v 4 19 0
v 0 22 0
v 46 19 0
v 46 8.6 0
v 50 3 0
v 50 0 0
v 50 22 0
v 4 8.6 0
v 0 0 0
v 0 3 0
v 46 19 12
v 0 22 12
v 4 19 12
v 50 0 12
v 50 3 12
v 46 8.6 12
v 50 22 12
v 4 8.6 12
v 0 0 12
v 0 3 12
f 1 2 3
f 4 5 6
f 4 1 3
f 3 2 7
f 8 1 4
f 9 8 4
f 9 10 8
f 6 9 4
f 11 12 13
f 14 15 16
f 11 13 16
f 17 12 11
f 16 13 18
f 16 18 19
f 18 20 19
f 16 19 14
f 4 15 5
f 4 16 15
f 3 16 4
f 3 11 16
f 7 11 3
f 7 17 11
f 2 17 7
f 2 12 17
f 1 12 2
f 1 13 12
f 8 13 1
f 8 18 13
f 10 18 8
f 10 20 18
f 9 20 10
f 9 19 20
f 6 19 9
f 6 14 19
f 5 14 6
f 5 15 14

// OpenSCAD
$fn = 32;

// ----------------------------------------------------------------------
// Key bar: dovetail key, 12 mm thick
// ----------------------------------------------------------------------

// --- parameters (mm) ---
profile_height = 12;      // extrusion height
profile_points = 10;      // points of the closed outline

profile = [[0, 0], [50, 0], [50, 3], [46, 8.6], [46, 19], [50, 22], [0, 22], [4, 19], [4, 8.6], [0, 3]];  // single closed polygon, 10 points, counter clockwise

// --- the one profile operation ---
linear_extrude(height = profile_height) polygon(points = profile);
